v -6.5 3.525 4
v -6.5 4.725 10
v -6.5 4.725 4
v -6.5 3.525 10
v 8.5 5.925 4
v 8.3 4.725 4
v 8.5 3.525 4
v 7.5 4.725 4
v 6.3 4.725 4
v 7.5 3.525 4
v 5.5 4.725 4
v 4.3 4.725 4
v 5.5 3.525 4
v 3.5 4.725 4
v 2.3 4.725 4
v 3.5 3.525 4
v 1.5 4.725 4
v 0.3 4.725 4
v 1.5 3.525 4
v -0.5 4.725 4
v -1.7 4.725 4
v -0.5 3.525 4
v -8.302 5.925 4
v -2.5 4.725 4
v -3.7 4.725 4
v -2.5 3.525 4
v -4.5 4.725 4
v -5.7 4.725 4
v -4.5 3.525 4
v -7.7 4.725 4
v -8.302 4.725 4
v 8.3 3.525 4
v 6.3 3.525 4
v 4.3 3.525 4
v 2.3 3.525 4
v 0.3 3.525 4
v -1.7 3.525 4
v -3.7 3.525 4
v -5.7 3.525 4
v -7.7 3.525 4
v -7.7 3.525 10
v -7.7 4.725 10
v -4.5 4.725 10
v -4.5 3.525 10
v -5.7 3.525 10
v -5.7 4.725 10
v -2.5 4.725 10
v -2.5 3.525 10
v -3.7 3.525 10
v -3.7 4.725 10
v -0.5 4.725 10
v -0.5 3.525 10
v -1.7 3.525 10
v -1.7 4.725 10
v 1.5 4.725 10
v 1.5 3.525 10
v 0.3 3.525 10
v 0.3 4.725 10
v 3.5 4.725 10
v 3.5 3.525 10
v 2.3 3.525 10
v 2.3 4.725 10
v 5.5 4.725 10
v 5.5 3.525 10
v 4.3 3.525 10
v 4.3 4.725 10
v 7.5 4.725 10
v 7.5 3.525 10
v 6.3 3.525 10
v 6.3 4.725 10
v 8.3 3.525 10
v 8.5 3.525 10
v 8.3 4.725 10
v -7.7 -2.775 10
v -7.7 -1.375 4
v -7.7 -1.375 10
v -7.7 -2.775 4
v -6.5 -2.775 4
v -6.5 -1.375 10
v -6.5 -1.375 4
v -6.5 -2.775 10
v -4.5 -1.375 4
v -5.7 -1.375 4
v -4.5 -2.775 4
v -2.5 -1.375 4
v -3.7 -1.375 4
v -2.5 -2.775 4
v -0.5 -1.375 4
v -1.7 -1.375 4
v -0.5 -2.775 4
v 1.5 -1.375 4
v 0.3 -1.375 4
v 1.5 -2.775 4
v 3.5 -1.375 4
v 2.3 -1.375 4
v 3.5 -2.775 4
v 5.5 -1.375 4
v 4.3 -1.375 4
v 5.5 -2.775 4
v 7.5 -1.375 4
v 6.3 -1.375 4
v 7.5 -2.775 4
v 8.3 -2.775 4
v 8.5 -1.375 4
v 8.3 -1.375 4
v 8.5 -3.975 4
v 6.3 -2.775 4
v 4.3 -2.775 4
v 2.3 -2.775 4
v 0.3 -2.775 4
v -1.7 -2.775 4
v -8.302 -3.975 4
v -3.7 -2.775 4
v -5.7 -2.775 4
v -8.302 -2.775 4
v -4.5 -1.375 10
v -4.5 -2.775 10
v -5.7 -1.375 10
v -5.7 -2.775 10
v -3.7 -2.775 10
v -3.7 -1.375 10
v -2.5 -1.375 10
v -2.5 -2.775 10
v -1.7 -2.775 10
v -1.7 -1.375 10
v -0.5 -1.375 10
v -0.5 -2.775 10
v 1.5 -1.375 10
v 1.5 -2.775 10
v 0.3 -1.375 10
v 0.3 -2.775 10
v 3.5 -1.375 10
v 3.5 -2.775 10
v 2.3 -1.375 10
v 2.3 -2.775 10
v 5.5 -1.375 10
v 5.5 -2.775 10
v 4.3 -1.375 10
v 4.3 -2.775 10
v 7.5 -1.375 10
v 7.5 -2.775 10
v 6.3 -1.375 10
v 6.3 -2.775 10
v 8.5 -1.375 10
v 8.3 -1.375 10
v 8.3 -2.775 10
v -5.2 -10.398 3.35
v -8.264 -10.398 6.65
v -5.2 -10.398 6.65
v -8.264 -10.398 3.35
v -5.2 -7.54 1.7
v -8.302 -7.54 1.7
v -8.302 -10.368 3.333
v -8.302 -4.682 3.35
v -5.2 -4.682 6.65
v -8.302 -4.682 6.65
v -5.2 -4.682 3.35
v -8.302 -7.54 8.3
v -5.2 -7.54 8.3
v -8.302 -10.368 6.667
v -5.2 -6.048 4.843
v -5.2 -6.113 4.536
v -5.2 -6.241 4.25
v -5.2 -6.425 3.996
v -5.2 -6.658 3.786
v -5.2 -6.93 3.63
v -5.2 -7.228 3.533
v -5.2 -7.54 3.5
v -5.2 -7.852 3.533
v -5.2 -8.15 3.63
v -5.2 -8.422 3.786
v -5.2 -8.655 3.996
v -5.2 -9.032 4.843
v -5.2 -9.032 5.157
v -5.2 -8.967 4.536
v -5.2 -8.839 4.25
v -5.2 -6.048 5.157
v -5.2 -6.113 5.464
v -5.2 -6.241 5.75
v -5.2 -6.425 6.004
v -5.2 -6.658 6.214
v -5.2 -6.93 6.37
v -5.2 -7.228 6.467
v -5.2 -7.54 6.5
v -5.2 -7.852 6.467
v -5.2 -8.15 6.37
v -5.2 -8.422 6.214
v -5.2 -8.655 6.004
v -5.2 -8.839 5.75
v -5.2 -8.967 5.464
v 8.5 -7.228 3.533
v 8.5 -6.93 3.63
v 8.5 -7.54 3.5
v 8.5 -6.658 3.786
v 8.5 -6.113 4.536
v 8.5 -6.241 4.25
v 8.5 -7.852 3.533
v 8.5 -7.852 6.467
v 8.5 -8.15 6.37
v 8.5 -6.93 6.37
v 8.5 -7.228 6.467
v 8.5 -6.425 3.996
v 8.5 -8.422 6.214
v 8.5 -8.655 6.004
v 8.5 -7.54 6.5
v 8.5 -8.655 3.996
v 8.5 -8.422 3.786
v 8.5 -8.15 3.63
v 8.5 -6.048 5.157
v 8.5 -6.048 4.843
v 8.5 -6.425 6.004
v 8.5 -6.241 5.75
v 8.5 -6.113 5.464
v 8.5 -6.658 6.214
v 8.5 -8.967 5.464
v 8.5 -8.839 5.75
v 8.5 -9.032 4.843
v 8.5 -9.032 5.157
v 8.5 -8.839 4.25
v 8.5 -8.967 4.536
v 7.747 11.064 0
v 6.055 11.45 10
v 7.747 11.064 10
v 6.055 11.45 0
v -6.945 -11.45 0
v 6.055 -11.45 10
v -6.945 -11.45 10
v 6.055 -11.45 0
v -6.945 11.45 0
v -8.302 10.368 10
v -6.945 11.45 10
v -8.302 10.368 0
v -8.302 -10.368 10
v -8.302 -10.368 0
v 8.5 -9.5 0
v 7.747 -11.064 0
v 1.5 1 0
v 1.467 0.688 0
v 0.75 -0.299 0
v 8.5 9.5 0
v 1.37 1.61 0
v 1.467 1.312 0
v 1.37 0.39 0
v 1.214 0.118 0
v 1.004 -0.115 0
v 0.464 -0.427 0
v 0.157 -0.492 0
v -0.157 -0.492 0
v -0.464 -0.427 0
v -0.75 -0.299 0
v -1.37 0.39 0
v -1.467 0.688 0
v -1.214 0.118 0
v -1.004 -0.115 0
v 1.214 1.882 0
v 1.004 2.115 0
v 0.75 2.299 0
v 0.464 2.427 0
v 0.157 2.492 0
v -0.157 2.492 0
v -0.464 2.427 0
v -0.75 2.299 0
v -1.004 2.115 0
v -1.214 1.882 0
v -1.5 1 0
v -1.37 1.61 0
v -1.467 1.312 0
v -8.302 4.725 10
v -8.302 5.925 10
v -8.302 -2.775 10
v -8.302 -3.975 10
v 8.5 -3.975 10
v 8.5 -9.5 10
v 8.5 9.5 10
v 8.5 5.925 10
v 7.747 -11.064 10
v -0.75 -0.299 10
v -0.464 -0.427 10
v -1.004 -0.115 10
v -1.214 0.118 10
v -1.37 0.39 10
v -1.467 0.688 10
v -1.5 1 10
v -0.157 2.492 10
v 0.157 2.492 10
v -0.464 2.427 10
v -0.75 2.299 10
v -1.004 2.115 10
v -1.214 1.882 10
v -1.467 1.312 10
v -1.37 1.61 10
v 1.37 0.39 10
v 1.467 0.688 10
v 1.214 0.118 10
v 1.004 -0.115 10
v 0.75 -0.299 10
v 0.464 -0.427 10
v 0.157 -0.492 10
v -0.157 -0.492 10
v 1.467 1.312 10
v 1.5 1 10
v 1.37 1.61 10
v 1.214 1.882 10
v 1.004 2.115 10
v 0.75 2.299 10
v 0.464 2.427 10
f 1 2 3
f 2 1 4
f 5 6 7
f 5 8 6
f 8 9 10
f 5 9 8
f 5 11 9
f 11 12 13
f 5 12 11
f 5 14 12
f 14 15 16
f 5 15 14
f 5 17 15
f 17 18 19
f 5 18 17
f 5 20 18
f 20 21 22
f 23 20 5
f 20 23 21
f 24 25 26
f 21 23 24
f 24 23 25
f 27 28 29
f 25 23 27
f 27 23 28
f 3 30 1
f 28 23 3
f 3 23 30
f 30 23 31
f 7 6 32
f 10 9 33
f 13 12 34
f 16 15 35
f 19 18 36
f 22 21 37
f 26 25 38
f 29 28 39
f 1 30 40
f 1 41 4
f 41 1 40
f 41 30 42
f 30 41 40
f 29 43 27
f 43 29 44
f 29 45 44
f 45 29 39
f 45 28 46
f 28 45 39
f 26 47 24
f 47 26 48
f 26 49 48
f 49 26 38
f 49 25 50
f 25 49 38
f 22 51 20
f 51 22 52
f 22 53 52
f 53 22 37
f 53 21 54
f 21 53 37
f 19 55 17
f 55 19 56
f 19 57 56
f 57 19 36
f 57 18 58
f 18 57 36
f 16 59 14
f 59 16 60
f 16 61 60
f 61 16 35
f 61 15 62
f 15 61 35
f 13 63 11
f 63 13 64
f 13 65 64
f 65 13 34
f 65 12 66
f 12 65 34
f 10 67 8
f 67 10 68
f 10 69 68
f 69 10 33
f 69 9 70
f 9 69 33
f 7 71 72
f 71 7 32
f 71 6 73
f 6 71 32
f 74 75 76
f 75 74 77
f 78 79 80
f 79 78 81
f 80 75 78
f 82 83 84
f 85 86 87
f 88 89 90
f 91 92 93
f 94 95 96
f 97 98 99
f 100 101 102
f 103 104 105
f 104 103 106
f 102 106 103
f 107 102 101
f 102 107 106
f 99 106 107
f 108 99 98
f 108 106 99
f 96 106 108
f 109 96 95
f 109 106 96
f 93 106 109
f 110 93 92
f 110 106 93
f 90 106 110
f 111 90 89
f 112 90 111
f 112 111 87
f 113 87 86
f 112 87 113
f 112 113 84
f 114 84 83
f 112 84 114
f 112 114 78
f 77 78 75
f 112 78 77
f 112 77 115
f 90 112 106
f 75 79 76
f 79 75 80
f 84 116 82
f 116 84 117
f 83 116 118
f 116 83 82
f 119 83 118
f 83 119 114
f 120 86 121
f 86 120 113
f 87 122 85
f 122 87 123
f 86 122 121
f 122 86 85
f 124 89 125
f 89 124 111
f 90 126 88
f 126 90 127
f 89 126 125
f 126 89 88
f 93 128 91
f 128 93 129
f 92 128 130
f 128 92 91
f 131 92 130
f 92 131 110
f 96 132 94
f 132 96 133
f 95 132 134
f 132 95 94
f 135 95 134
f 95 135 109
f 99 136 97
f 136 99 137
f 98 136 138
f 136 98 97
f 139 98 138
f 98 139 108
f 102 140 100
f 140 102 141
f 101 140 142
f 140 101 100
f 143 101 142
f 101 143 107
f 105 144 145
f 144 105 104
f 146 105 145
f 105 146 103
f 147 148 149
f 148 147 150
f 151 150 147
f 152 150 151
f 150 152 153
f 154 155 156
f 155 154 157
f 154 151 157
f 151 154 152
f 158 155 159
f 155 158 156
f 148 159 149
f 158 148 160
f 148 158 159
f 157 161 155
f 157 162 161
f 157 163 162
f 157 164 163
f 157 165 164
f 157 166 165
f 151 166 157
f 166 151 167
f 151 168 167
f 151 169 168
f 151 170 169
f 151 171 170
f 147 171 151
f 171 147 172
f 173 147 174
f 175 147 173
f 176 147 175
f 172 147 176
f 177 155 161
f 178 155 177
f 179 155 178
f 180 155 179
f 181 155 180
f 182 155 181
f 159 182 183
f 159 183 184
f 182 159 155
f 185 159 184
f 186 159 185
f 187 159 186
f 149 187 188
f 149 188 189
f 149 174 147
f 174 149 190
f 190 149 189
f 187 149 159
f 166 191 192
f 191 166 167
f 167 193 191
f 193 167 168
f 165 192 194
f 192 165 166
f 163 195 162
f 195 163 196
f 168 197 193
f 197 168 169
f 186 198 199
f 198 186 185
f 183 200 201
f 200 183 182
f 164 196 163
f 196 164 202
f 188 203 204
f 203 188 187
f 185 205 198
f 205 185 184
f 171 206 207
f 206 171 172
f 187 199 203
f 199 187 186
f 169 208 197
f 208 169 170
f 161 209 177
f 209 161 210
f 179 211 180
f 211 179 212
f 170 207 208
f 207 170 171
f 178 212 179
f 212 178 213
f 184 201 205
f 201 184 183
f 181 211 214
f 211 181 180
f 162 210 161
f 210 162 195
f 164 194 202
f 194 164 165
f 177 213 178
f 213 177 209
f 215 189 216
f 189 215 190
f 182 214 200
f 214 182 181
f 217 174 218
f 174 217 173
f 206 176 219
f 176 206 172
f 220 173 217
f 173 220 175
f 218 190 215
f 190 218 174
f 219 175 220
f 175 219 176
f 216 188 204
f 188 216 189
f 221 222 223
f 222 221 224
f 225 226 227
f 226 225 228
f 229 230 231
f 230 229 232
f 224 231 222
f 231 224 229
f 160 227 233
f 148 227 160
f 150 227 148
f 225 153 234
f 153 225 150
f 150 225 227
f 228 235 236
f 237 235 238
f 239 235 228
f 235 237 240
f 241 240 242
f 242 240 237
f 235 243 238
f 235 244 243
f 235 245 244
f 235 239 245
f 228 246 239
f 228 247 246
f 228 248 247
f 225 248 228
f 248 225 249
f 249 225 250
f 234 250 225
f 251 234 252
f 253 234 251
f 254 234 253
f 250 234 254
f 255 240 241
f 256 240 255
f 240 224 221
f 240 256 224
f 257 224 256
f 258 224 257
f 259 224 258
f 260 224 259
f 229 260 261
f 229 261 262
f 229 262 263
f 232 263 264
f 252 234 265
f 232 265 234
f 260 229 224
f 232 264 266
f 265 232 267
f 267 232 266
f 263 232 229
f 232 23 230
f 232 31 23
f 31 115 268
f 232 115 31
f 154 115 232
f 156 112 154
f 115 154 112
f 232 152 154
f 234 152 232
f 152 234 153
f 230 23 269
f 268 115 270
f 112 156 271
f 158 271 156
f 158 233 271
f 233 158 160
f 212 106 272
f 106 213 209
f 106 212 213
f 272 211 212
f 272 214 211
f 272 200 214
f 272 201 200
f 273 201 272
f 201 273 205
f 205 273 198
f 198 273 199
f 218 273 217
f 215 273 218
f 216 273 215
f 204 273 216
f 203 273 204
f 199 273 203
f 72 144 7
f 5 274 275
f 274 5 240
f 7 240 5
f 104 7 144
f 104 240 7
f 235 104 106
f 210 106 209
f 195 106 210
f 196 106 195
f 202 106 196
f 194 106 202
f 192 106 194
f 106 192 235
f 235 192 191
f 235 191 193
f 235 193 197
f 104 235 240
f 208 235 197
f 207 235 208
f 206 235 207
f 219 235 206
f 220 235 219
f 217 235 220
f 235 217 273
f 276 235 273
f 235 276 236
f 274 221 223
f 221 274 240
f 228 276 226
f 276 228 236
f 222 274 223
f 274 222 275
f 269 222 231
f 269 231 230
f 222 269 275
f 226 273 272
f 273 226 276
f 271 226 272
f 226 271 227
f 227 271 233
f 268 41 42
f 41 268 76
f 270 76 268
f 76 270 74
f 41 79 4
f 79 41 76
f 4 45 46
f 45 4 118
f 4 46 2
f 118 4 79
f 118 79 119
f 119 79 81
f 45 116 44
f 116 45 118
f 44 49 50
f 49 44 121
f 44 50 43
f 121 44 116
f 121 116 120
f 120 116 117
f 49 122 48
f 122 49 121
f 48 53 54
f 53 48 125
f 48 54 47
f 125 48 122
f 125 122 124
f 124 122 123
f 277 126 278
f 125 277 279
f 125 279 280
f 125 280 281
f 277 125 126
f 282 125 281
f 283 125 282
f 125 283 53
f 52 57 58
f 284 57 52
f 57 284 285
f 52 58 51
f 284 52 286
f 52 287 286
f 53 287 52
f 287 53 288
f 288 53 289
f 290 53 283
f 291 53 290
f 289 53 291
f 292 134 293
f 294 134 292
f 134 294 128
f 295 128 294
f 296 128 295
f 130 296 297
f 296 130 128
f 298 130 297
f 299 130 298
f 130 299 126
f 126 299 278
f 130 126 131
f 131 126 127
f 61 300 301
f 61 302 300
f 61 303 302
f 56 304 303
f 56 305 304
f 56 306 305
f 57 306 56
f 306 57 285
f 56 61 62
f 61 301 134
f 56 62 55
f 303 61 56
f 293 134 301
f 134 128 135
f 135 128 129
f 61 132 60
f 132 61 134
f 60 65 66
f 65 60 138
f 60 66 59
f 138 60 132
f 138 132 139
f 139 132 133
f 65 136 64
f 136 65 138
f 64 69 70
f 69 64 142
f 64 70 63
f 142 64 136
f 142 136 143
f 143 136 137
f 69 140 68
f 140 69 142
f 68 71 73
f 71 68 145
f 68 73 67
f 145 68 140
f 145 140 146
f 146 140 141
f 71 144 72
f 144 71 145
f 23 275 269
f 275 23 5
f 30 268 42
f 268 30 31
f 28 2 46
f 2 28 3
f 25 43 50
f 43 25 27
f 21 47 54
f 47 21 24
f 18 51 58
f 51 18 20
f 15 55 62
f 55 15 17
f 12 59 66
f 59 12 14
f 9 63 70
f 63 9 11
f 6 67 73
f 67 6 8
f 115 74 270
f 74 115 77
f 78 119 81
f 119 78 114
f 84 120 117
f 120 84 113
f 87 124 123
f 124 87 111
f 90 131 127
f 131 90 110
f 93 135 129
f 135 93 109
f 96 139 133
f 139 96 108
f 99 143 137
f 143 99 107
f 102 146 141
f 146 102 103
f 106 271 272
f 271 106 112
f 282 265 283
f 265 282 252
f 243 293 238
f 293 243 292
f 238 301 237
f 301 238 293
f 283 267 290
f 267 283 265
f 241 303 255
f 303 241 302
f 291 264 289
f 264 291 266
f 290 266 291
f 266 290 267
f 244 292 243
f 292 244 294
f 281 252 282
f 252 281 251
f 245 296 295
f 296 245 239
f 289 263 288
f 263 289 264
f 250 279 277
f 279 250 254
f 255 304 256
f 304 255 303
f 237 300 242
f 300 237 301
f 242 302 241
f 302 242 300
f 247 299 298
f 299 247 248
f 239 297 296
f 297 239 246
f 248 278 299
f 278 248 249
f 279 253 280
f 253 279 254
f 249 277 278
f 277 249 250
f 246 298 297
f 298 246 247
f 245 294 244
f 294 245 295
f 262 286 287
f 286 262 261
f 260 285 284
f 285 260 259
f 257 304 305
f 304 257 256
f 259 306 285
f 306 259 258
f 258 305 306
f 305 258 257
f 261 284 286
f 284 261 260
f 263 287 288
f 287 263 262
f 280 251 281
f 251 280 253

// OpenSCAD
// Graber i3 xy belt holder v1.0 by ValterFC
// december / 2013

// x axis not yet - sorry

// ******************************************************
// Select your belt type *NOT TESTED*
// ******************************************************
//T2.5
//belt_tooth_distance = 2.5;
//belt_tooth_ratio = 0.8;

//T5 (strongly discouraged)
//belt_tooth_distance = 5;
//belt_tooth_ratio = 1.05;

//HTD3
//belt_tooth_distance = 3;
//belt_tooth_ratio = 1.05;

//MXL
//belt_tooth_distance = 2.032;
//belt_tooth_ratio = 0.94;

//GT2
belt_tooth_distance = 2; // [2.5:T2.5, 5:T5, 3:HTD3, 2.032:MXL, 2:GT2]
belt_tooth_ratio = 0.8; // [0.8:T2.5, 1.05:T5, 1.05:HTD3, 0.94:MXL, 0.8:GT2]

//what file to generate?
make_object = 0; // [0:fixed object, 1:tensiometer object]

//side nut orientation
side_nut_orientation = 0; // [0:normal, 1:another way]

/*Non customizer variables*/
length = 17+0;
width = 10+0;
thickness = 21+0;
extra = 0.2+0;
belt_width = 6+0;
belt_thickness = 1.2+0; // Excluding teeth height (0.9)
belt_pitch = belt_tooth_distance+0;
teeth_height = 1.1+0;
teeth_width = belt_tooth_ratio+0;
screw_hole_diameter = 3+0;
nut_diameter = 5+0.8;
nut_thickness = 2.5+0;

// from thingiverse.com/thing:9347
module roundedRect(size, radius)
{
	x = size[0]-radius;
	y = size[1];
	z = size[2];
	linear_extrude(height=z)
	hull()
	{
		// place 4 circles in the corners, with the given radius
  		translate([(-x/2)+(radius/2), (-y/2)+(radius/2), 0])
			circle(r=radius);

		translate([(x/2)-(radius/2), (-y/2)+(radius/2), 0])
			circle(r=radius);

		translate([(-x/2)+(radius/2), (y/2)-(radius/2), 0])
			circle(r=radius);

		translate([(x/2)-(radius/2), (y/2)-(radius/2), 0])
			circle(r=radius);
	}
}

module sidenut() {
	//nut fitting
	if (make_object == 0) cylinder( h=nut_thickness+0.8,r=nut_diameter/2+extra*2,$fn=6 );
	//the screw cylinder
	cylinder( h=thickness+1, r=screw_hole_diameter/2, $fn=30);
}

difference()
{
	roundedRect([length,thickness,width], 2);

	//+++++++++++++++++++++++++++++++++++++++
	// belt top
	translate([-length/2,((thickness+belt_thickness+teeth_height)/4)-teeth_height,width-belt_width])
		cube([length,belt_thickness,belt_width+1]);

	// tooth top
	for( x = [0:belt_pitch:length+1] )
	{
		translate([x-length/2,((thickness+belt_thickness+teeth_height)/4),width-belt_width])
   		rotate(a=180,v=[0,0,1])
			cube(size=[belt_pitch-teeth_width,teeth_height+belt_thickness,belt_width+1], center=false);
	}
	//+++++++++++++++++++++++++++++++++++++++


	//+++++++++++++++++++++++++++++++++++++++
	// belt button
	translate([-length/2,((thickness+belt_thickness+teeth_height)/4)-(teeth_height+8.7),width-belt_width])
		cube([length,belt_thickness,belt_width+1]);

	// tooth button
	for( x = [0:belt_pitch:length+1] )
	{
		translate([x-length/2,((thickness+belt_thickness+teeth_height)/4)-7.2,width-belt_width])
   		rotate(a=180,v=[0,0,1])
			cube(size=[belt_pitch-teeth_width,teeth_height+belt_thickness,belt_width+1], center=false);
	}
	//+++++++++++++++++++++++++++++++++++++++

	// top nut
	if (make_object == 1)
	{
		translate([-3.0,1,width+1]) rotate([180,0,0])
			cylinder( h=width+2,r=screw_hole_diameter/2,$fn=30);

		translate([0,1,0]) rotate([180,0,0])
		cube(size=[width-4,screw_hole_diameter,30], center=true);

		translate([+3.0,1,width+1]) rotate([180,0,0])
			cylinder( h=width+2,r=screw_hole_diameter/2,$fn=30);
	}

	translate([0,1,width+1]) rotate([180,0,0])
		cylinder( h=width+2, r=screw_hole_diameter/2, $fn=30);

	// side nut
	if (side_nut_orientation == 0)
	{
		translate([-length/2,-nut_diameter*1.3,width/2]) rotate([0,-270,0]) //original way
			sidenut();
	} else {
		translate([-length/2,-nut_diameter*1.42,width/2]) rotate([0,-270,0]) rotate([0,0,90]) //another way
			sidenut();
	}
}
